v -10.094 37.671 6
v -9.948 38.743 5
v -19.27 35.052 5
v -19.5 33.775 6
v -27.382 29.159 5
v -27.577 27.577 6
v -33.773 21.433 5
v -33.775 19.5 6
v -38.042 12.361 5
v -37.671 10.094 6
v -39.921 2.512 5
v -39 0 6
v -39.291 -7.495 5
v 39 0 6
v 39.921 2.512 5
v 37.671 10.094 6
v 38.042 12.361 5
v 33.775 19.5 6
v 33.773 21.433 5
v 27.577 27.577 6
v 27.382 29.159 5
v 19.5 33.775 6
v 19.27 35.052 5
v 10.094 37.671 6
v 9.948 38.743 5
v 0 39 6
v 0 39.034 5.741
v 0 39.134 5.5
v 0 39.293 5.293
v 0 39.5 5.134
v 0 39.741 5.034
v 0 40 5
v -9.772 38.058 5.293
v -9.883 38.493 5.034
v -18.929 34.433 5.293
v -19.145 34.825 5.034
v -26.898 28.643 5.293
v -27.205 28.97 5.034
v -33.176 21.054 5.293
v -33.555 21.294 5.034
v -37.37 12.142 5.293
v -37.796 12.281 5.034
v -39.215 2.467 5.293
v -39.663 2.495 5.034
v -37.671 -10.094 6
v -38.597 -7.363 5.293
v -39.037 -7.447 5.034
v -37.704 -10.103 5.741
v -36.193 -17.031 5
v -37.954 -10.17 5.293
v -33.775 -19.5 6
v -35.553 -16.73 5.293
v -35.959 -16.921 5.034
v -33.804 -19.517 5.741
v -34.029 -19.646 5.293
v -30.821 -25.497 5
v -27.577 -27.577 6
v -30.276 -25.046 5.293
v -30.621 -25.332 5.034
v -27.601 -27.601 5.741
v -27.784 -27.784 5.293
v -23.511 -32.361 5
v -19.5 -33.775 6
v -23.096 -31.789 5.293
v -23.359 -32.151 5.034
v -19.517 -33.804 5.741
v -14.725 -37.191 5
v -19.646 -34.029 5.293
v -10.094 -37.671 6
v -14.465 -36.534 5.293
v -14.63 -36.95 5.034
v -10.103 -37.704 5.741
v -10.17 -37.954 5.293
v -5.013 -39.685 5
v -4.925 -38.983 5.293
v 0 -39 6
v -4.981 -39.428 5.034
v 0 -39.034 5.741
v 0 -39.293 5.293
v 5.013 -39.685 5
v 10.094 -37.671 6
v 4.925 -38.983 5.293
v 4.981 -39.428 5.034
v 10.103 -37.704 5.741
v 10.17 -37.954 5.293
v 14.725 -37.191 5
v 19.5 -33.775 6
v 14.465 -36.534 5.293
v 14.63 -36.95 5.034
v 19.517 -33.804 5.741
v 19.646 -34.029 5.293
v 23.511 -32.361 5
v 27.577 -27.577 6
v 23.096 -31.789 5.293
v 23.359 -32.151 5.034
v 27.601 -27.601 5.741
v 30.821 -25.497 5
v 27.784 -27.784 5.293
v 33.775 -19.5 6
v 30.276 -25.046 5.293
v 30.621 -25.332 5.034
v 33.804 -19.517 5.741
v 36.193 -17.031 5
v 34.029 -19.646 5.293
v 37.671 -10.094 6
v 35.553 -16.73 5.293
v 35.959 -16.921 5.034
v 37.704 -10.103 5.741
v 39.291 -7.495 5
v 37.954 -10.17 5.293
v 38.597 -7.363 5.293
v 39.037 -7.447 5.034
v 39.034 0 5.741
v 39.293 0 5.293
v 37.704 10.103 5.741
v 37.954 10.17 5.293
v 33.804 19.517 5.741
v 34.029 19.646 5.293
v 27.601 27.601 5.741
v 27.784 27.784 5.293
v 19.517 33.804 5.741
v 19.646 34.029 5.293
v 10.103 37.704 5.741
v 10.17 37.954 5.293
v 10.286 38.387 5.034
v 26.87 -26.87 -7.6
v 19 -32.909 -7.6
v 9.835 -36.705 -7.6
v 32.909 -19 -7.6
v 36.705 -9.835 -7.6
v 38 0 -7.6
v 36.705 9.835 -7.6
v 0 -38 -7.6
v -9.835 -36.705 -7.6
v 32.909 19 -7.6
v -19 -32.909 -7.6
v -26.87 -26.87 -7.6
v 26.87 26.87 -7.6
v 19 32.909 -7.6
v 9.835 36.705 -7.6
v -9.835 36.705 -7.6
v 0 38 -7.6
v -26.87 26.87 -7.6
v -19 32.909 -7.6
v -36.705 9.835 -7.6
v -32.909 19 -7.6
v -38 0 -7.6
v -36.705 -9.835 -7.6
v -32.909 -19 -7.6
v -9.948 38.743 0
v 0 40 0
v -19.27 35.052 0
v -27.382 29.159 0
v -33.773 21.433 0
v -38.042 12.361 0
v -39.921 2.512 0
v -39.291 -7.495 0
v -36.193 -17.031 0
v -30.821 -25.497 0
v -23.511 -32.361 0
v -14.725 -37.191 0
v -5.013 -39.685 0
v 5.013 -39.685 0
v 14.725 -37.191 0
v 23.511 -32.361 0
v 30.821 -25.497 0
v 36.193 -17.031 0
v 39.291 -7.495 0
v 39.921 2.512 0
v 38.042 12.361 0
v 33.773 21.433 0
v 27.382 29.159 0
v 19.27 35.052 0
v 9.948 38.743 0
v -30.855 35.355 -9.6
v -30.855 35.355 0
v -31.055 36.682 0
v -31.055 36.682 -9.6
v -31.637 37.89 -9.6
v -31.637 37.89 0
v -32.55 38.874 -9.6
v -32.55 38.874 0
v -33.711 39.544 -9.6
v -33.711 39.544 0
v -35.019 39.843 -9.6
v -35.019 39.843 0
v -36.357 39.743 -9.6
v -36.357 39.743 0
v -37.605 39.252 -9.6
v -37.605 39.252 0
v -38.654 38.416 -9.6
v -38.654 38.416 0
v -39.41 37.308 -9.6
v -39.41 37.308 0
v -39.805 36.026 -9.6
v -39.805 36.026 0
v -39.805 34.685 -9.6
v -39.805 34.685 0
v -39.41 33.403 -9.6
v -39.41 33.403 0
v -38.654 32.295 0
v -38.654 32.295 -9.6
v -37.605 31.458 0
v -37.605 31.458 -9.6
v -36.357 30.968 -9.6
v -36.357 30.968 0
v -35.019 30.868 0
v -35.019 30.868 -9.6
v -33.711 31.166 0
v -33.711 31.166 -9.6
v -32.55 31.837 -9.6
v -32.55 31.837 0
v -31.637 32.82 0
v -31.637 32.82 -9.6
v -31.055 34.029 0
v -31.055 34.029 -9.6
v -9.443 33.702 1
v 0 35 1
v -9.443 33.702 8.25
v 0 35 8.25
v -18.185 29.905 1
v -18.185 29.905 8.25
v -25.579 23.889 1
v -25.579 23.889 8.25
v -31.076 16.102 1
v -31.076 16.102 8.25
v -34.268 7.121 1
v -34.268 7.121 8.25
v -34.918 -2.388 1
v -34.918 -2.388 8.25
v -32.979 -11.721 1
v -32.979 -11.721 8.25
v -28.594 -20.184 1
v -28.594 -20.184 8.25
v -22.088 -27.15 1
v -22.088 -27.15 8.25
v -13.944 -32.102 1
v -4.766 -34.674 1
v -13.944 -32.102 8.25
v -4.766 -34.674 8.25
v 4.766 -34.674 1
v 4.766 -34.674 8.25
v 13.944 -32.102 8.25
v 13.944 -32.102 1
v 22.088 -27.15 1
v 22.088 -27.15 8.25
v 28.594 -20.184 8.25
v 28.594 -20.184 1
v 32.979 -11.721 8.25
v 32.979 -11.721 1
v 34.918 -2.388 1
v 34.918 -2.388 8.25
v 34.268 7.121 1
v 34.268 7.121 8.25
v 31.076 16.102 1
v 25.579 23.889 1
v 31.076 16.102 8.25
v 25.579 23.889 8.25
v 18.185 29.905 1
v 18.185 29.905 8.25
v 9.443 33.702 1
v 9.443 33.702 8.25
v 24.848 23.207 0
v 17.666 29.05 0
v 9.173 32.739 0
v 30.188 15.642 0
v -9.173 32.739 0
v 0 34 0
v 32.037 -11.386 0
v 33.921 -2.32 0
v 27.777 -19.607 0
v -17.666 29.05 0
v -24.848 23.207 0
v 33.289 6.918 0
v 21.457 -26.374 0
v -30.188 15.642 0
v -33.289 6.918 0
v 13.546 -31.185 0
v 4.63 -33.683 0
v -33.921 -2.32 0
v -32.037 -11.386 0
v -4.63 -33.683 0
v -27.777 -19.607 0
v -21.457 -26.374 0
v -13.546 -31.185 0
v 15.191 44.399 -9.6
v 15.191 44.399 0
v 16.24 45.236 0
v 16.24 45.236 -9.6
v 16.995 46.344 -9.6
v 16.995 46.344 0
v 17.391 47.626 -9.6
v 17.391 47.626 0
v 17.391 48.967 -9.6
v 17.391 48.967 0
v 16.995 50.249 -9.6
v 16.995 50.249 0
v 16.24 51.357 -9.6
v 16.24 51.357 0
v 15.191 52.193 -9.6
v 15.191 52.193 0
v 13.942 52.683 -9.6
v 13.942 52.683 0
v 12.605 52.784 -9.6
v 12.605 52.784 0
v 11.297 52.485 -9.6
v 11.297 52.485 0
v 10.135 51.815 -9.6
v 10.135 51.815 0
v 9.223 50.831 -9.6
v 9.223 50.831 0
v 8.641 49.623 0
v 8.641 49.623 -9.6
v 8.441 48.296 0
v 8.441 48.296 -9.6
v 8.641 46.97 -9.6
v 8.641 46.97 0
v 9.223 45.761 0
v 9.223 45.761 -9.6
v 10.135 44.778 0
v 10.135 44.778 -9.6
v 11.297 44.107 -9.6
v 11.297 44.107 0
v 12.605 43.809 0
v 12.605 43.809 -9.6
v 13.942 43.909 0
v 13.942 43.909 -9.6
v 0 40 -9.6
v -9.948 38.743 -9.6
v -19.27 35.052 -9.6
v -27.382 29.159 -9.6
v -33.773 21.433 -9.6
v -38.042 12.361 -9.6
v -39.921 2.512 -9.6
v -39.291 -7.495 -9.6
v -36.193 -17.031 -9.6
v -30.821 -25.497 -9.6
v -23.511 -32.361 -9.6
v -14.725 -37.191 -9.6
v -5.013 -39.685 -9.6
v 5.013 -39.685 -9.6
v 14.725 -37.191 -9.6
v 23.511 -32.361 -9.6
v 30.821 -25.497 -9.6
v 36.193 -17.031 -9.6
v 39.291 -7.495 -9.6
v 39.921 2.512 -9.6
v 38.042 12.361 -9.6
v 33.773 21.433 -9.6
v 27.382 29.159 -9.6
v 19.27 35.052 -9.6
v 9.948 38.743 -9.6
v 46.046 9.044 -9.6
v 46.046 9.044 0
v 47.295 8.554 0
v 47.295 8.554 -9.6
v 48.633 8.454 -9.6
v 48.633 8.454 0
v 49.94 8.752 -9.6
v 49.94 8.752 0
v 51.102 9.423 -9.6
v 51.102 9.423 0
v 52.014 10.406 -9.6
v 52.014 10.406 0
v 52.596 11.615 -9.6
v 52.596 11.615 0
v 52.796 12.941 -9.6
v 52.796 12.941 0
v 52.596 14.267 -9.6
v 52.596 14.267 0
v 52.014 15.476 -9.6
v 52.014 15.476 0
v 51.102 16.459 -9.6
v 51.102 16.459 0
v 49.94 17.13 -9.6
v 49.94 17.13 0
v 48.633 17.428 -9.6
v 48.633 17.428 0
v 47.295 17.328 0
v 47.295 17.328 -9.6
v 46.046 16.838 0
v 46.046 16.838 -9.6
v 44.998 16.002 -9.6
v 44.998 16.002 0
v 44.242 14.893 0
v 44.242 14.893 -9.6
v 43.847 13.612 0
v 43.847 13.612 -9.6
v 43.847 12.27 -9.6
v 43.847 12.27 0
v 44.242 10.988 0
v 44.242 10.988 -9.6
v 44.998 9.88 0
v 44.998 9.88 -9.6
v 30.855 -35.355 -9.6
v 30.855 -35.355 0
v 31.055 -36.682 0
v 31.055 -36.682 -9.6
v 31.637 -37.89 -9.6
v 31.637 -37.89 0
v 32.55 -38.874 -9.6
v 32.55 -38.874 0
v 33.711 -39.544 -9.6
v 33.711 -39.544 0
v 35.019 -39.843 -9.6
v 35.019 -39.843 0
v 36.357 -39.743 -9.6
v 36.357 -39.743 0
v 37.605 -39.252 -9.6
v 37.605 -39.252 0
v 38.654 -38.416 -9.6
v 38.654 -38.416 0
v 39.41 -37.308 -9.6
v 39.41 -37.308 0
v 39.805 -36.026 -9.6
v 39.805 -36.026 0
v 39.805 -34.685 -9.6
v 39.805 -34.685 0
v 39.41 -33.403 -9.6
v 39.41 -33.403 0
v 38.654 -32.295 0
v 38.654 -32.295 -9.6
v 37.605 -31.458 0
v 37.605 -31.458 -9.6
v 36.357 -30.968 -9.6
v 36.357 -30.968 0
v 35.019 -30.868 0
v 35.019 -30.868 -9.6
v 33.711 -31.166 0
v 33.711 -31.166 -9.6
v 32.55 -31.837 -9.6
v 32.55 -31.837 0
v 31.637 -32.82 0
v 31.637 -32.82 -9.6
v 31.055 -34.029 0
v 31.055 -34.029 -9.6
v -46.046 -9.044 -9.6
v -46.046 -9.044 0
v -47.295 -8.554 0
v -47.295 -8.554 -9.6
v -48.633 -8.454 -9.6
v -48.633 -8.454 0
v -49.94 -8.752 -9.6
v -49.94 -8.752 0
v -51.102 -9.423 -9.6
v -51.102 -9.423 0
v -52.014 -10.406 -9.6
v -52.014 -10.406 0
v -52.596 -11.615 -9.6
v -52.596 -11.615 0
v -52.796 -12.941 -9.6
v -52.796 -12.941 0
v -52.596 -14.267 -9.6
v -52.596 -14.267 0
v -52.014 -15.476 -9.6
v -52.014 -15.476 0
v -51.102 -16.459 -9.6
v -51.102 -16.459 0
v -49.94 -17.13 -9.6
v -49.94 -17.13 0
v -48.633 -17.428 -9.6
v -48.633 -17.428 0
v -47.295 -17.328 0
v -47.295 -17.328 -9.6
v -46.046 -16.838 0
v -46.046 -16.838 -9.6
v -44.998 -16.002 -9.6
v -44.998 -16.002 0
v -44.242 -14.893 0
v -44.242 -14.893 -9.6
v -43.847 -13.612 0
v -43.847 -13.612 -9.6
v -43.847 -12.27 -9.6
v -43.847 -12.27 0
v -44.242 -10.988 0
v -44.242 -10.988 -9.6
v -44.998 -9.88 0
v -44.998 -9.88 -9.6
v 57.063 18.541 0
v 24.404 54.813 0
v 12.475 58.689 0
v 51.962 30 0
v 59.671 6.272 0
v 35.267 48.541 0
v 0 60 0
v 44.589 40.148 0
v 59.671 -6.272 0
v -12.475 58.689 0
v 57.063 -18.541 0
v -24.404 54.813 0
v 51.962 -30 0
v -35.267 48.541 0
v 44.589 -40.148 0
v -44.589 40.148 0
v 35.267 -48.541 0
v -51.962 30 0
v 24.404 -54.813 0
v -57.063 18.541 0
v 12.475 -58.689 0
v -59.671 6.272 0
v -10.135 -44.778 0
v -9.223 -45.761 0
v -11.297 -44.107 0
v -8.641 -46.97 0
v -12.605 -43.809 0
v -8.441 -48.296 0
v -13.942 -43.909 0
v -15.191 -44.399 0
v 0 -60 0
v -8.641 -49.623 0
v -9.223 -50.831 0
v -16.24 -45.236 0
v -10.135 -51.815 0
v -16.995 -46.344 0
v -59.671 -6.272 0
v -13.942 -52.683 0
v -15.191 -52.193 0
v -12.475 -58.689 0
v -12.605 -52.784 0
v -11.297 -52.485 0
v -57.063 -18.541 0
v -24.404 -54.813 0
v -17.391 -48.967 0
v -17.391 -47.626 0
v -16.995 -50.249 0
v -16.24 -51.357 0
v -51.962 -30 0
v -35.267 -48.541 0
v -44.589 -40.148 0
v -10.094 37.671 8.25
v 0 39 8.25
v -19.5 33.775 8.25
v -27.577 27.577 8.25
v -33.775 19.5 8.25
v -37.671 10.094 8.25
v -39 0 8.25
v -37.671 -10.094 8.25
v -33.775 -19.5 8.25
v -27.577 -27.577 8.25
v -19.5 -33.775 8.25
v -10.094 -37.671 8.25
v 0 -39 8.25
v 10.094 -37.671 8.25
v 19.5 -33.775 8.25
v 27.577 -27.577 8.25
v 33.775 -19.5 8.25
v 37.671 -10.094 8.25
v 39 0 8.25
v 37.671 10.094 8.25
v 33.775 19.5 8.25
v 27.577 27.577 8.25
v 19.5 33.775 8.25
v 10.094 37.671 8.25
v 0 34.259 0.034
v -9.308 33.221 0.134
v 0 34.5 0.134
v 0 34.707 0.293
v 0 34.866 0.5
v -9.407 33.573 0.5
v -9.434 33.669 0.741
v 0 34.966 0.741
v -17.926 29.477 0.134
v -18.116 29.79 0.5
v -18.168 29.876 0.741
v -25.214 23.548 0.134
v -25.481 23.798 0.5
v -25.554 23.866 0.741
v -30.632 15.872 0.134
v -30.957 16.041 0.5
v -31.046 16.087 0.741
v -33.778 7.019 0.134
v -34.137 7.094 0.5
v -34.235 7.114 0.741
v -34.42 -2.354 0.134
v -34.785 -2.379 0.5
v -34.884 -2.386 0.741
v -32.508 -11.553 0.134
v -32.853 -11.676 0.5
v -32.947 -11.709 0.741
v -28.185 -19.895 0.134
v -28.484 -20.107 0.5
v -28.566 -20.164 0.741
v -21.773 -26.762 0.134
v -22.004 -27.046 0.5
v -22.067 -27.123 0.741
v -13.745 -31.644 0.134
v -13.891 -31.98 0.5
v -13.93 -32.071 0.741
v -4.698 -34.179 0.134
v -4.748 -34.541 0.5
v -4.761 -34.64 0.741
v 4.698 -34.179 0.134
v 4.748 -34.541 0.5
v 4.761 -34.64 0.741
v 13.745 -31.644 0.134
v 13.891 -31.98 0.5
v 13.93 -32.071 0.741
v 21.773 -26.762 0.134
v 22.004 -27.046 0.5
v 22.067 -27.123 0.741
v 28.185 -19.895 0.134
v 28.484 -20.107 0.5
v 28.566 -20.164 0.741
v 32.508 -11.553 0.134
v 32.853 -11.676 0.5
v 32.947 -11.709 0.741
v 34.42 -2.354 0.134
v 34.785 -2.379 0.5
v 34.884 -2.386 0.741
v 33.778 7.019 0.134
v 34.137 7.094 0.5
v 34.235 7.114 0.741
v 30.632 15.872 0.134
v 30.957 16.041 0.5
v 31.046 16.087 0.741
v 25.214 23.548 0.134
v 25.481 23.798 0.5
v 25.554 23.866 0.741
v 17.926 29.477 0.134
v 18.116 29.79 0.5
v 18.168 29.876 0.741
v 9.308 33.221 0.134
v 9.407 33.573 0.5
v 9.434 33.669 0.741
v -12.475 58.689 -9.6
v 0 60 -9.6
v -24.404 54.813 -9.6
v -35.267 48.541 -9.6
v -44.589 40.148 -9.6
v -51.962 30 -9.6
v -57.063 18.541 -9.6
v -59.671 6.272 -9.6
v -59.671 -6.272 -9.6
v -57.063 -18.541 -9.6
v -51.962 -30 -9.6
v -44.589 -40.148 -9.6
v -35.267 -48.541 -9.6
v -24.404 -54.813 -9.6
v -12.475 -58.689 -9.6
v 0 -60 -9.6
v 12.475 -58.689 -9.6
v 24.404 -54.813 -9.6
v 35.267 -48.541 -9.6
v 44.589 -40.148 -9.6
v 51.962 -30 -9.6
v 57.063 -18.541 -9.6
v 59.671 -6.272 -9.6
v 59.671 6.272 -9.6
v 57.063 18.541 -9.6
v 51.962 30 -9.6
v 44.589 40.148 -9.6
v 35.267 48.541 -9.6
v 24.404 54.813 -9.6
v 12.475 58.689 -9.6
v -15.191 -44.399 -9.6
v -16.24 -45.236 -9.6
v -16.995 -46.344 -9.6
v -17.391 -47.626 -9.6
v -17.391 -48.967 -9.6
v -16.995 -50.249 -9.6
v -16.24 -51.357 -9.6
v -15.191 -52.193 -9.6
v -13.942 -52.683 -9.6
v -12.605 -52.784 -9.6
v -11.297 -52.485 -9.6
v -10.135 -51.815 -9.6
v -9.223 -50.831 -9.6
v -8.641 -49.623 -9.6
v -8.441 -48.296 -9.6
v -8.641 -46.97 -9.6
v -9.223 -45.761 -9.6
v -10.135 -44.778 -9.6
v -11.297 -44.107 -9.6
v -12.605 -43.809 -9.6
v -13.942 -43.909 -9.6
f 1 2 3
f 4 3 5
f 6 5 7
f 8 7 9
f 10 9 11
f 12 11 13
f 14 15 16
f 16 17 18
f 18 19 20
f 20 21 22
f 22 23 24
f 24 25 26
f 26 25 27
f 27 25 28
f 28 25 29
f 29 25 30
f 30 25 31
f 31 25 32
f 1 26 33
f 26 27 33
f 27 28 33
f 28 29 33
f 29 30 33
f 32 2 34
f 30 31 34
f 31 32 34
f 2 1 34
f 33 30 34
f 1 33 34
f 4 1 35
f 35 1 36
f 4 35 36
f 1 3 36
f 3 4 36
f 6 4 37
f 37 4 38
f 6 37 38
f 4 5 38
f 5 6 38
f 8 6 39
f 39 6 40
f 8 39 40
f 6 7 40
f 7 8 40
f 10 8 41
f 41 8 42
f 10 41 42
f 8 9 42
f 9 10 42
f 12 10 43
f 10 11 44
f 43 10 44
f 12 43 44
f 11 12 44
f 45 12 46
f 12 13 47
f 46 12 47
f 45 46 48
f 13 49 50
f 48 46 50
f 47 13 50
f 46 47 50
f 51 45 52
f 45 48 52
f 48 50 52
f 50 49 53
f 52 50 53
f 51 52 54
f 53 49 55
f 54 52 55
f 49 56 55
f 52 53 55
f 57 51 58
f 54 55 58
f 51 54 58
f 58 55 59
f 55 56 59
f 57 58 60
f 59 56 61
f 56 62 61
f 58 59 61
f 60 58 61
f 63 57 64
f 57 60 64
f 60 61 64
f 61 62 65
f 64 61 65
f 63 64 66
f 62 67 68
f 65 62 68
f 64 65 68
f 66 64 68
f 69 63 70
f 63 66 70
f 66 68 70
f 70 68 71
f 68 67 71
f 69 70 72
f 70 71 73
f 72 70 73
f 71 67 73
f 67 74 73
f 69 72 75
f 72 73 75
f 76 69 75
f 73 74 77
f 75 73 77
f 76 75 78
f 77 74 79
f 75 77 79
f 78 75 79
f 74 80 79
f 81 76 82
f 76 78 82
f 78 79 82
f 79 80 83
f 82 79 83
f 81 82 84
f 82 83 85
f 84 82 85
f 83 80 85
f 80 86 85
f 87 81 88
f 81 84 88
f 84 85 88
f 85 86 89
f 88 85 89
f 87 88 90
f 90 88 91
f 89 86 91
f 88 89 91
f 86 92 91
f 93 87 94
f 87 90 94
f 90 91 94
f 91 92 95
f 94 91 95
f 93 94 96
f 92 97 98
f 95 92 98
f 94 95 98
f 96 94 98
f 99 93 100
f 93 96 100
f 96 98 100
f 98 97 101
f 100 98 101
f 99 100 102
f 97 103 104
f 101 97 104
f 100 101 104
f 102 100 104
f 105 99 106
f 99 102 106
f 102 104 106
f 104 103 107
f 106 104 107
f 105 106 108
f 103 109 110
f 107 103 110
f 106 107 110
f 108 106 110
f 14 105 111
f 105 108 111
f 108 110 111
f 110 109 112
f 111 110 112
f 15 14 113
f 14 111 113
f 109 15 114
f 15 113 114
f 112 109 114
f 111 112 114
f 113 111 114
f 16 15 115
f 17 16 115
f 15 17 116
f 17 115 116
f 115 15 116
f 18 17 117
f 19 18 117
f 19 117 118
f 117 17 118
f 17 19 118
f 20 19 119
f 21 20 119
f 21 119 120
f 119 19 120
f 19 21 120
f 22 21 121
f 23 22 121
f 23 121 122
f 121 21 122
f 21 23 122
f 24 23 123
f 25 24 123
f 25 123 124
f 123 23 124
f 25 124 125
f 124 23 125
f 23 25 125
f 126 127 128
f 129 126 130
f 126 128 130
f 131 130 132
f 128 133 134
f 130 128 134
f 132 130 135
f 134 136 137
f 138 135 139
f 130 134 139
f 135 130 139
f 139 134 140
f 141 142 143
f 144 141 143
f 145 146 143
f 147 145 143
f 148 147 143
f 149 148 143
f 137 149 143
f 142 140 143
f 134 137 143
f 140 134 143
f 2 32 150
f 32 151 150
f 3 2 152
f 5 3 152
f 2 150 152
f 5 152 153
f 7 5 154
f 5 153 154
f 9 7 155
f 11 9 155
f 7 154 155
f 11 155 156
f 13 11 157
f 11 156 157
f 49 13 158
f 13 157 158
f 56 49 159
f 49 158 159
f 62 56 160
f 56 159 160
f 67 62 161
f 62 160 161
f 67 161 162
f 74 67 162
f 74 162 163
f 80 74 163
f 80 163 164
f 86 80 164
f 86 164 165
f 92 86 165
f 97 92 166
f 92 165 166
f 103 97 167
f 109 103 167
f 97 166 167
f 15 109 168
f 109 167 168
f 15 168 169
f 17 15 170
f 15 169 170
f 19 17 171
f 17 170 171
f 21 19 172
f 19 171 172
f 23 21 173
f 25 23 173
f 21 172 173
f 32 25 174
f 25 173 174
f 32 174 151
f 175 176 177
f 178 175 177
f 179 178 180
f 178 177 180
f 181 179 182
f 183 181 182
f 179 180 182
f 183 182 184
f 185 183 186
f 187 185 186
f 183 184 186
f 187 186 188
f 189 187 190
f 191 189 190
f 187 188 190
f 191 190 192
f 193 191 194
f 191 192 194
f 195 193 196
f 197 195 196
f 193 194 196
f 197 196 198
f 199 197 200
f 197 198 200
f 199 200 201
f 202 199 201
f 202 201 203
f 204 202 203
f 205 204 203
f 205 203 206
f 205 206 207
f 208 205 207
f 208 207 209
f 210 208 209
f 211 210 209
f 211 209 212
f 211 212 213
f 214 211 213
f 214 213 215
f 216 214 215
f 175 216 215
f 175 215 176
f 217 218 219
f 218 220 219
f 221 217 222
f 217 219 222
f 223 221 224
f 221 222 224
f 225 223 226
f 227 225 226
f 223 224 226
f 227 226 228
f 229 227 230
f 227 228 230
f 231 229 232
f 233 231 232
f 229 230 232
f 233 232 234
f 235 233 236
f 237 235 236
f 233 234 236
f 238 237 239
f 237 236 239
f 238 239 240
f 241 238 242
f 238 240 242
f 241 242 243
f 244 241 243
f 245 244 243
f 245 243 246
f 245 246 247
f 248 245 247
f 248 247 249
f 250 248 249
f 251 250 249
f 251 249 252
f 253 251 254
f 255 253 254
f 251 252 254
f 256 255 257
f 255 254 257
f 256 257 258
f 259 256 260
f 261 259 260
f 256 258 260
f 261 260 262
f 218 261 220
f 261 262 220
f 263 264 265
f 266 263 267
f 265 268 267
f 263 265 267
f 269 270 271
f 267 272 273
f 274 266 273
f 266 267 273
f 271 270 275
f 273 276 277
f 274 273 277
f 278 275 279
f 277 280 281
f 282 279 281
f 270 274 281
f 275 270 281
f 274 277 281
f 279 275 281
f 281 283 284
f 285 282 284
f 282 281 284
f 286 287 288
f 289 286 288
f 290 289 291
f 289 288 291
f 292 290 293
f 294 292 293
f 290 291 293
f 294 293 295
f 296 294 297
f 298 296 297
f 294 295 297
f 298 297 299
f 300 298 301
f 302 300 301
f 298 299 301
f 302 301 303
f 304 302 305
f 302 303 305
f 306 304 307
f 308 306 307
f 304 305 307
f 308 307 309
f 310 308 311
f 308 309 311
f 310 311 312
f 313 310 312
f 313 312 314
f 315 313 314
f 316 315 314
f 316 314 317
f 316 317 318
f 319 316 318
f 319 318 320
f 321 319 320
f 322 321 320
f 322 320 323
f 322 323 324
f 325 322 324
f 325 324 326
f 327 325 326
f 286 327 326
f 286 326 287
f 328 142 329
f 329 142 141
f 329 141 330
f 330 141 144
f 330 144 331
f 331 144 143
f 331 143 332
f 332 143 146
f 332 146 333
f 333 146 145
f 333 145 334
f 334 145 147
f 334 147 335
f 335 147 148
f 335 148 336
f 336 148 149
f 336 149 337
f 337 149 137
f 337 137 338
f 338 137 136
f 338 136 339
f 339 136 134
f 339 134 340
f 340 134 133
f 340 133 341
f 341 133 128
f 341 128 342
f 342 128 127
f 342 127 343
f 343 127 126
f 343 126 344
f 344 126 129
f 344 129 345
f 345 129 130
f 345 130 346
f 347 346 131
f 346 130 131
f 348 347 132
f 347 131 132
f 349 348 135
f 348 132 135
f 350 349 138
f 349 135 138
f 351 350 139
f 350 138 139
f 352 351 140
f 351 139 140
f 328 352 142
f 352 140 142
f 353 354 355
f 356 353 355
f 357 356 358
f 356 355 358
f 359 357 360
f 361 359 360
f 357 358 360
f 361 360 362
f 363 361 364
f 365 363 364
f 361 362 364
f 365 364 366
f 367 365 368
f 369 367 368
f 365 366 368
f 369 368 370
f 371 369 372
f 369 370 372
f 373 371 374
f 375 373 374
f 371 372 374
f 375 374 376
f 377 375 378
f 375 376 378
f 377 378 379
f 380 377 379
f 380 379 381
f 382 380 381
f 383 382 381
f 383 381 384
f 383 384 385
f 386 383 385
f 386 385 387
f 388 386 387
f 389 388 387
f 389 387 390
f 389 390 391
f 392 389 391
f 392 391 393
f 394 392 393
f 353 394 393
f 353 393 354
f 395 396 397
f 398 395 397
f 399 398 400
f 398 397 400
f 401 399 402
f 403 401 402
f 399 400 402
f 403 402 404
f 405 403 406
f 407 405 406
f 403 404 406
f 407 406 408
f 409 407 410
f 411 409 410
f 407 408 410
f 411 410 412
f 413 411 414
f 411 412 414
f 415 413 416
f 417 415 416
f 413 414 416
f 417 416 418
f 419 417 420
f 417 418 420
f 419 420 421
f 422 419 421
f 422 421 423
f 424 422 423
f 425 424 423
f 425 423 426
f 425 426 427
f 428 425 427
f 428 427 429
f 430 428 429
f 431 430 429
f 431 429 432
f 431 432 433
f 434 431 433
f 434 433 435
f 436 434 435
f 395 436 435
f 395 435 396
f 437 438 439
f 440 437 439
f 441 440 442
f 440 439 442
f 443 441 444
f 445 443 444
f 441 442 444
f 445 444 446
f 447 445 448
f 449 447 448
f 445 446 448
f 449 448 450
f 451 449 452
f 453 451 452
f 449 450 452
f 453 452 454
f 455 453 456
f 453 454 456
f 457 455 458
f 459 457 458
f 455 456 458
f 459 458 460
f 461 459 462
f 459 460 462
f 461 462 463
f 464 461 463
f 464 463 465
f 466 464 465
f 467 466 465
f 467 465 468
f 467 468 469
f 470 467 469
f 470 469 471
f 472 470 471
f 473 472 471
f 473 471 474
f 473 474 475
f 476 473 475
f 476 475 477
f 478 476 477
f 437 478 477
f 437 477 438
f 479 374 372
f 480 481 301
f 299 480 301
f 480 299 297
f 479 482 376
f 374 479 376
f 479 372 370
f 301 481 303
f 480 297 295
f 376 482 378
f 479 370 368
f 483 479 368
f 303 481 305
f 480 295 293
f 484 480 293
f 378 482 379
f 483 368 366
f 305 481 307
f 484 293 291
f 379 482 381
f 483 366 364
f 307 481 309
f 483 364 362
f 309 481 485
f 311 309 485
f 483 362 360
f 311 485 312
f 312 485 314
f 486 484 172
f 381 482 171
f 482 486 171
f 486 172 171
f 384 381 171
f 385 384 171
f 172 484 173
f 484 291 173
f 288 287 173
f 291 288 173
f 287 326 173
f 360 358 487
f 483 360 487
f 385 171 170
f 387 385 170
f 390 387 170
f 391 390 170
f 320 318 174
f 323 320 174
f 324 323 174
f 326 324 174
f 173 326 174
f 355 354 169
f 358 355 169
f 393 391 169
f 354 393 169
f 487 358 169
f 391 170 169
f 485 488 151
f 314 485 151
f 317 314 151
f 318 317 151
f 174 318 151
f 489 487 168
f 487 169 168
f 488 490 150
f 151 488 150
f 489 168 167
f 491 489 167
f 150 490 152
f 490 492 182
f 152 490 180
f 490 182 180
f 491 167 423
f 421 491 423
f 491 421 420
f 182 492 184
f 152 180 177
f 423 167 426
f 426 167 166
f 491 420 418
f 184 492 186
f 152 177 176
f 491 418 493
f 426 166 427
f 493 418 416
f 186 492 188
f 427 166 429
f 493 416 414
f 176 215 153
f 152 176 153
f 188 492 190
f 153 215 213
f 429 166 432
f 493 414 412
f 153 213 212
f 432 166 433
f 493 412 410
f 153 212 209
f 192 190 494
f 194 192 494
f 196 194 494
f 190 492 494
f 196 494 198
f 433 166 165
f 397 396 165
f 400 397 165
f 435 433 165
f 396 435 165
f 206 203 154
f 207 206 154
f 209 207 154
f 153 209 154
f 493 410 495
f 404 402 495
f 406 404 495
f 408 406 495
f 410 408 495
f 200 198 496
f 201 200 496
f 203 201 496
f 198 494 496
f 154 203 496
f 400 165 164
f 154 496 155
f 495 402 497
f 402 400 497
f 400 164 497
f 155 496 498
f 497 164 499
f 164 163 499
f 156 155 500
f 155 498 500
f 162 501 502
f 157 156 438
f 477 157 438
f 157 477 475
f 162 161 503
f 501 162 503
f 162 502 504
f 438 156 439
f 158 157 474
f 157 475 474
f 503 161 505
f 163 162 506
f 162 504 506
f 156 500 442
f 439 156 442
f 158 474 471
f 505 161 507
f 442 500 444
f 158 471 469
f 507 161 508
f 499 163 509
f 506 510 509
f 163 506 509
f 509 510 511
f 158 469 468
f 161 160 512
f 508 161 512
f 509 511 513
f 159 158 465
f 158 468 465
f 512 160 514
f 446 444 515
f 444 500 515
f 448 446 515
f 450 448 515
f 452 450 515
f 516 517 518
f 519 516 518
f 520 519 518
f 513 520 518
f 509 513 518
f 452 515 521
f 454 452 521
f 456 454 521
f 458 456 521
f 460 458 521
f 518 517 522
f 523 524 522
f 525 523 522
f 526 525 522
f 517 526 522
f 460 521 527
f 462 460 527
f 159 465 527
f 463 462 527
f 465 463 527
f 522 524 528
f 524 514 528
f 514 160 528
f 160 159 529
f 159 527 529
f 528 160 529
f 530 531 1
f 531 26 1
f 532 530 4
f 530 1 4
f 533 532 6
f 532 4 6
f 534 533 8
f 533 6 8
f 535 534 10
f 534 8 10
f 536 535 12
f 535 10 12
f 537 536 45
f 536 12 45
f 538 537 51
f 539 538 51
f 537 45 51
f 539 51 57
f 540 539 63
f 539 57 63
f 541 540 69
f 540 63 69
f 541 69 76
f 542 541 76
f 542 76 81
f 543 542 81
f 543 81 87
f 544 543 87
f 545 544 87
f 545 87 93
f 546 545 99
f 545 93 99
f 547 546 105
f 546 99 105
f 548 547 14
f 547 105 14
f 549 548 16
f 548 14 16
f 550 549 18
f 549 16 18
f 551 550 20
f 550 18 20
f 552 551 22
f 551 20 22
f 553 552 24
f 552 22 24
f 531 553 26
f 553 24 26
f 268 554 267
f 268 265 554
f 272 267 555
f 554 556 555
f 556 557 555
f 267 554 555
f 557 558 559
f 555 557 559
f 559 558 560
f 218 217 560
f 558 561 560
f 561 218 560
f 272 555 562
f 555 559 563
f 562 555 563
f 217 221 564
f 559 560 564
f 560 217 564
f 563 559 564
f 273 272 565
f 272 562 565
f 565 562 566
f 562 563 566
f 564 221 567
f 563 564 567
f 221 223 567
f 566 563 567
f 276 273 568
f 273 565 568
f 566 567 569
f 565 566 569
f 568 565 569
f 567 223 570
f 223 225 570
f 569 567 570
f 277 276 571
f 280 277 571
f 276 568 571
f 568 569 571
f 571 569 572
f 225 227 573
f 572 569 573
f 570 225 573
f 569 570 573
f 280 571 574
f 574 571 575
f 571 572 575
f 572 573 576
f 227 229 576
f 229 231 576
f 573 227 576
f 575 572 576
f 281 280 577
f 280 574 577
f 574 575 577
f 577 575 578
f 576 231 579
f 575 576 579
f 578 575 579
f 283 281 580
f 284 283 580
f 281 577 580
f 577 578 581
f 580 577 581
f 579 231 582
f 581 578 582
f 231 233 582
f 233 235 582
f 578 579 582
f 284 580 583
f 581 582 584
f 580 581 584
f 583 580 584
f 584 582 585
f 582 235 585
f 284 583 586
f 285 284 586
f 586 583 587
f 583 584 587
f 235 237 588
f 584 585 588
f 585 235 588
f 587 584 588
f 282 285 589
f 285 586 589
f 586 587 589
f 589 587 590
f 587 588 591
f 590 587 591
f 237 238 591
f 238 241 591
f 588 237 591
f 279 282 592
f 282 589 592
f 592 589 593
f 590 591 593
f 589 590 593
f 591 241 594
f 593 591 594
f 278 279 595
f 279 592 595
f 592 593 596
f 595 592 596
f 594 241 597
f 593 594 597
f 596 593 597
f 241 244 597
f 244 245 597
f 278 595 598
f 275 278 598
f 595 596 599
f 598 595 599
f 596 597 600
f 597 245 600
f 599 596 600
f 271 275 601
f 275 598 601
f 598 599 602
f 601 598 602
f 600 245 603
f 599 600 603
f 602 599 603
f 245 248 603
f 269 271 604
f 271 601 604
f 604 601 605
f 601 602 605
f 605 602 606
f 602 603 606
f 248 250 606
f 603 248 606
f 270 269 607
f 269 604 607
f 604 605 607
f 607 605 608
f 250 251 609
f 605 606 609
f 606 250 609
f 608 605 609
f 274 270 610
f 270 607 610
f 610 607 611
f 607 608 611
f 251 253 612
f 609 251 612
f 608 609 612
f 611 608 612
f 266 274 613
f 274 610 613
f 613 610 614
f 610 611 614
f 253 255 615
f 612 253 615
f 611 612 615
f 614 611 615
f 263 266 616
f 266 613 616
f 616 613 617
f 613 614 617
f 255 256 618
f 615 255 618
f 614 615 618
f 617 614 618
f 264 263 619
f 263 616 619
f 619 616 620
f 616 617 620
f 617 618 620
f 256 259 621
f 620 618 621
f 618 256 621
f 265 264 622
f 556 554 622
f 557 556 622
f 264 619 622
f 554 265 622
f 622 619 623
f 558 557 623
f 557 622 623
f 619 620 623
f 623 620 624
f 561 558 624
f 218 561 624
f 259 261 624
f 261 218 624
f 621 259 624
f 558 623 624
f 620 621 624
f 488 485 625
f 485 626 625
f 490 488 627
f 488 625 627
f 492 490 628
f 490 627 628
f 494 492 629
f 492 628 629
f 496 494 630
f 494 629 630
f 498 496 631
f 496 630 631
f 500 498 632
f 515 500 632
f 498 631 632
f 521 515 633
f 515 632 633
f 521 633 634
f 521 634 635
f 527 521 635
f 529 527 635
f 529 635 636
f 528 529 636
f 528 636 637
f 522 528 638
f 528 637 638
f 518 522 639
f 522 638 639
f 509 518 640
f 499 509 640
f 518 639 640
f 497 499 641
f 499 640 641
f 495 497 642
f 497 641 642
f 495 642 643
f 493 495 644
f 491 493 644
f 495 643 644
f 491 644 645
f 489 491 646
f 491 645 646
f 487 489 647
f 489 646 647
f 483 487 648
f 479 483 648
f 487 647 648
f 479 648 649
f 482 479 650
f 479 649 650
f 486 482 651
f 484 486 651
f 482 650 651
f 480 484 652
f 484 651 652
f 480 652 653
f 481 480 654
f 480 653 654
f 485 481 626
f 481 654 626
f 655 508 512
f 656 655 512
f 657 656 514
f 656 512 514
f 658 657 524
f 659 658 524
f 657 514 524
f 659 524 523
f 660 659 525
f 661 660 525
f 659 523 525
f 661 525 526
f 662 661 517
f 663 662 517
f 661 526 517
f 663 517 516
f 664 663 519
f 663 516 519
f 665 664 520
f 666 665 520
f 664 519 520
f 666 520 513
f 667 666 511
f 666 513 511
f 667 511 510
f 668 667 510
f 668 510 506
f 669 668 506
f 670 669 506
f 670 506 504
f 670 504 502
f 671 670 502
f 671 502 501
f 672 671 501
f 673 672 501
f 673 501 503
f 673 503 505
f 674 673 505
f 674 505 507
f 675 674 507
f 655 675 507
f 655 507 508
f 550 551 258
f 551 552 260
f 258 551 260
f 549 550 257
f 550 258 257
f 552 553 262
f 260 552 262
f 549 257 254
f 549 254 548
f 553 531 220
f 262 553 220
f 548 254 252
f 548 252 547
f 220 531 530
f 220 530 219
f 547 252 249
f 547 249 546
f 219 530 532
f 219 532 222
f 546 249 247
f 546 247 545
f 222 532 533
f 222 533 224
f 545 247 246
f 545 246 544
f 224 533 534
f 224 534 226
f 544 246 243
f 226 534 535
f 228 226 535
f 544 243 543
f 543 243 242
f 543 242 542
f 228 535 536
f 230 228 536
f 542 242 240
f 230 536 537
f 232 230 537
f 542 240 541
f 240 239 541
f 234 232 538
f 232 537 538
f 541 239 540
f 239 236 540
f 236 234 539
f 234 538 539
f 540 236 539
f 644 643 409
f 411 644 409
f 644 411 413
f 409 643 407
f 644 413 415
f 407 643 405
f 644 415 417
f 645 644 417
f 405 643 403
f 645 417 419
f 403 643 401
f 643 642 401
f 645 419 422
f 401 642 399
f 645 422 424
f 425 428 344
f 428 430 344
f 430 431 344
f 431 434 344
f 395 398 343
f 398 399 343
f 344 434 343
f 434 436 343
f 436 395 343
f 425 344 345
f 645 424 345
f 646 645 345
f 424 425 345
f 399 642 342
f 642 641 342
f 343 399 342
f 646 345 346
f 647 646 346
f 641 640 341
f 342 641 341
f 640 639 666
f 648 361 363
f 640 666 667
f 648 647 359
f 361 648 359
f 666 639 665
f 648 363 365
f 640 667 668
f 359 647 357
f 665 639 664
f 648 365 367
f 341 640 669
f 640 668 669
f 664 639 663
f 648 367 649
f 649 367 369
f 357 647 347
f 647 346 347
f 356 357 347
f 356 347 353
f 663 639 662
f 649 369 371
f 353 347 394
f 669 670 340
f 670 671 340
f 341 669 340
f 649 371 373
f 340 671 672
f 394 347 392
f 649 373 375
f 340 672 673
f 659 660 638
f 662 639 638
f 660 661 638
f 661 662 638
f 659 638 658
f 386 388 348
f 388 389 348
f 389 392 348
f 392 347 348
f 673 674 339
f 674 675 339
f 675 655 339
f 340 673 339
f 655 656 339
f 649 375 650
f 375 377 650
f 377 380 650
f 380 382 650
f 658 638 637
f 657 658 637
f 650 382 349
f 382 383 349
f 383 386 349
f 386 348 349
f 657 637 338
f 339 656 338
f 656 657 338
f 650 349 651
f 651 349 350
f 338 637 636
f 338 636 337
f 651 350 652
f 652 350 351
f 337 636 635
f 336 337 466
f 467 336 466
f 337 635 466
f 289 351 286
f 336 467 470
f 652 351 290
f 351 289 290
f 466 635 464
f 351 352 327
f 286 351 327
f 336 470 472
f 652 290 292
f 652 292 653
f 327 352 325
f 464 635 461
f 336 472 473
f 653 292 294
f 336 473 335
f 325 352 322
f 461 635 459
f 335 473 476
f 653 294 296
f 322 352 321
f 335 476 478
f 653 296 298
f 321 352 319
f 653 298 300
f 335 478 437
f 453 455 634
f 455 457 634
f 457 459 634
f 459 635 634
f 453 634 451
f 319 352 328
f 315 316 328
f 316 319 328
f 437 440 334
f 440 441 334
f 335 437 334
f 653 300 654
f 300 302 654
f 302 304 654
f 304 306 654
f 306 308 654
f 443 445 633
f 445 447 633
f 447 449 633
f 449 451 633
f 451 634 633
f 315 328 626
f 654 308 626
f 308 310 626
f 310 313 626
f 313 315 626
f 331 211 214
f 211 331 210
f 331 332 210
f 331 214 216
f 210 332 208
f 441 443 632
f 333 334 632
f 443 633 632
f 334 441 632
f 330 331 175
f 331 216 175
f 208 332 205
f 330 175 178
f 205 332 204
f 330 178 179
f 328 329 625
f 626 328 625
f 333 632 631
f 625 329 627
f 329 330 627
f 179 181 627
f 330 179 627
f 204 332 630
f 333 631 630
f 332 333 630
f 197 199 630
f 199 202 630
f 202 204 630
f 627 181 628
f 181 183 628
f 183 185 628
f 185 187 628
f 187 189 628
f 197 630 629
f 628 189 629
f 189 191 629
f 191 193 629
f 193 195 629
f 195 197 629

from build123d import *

# Parameters (mm, degrees)
M8_CLEARANCE_HOLE1_D = 9
CIRPATTERN1_COUNT    = 6


with BuildPart() as part:
    # Sketch1 → Revolve1 (revolve)
    with BuildSketch(Plane(origin=(0, 0, 0), x_dir=(0, 0, -1), z_dir=(1, 0, 0))):
        with BuildLine():
            Line((0, 0), (0, 34))
            ThreePointArc((0, 34), (-0.292893219, 34.707106781), (-1, 35))
            Line((-1, 35), (-8.25, 35))
            Line((-8.25, 35), (-8.25, 39))
            Line((-8.25, 39), (-6, 39))
            ThreePointArc((-6, 39), (-5.292893219, 39.292893219), (-5, 40))
            Line((-5, 40), (0, 40))
            Line((0, 40), (0, 60))
            Line((0, 60), (9.6, 60))
            Line((9.6, 60), (9.6, 40))
            Line((9.6, 40), (7.6, 38))
            Line((7.6, 38), (7.6, 0))
            Line((7.6, 0), (0, 0))
        make_face()
    revolve(axis=Axis((0, 0, -9.6), (0, 0, 1)))

    # M8 Clearance Hole1 (through all)
    with Locations(Plane(origin=(0, 0, -9.6), x_dir=(-1, 0, 0), z_dir=(0, 0, -1))):
        with Locations((35.355339059, 35.355339059)):
            m8_clearance_hole1 = Hole(M8_CLEARANCE_HOLE1_D / 2)

    # CirPattern1: M8 Clearance Hole1 ×6 about axis
    cirpattern1_axis = Axis((0, 0, 0), (0, 0, 1))
    for i in range(1, CIRPATTERN1_COUNT):
        add(m8_clearance_hole1.rotate(cirpattern1_axis, i * 360 / CIRPATTERN1_COUNT), mode=Mode.SUBTRACT)


solid = part.part
